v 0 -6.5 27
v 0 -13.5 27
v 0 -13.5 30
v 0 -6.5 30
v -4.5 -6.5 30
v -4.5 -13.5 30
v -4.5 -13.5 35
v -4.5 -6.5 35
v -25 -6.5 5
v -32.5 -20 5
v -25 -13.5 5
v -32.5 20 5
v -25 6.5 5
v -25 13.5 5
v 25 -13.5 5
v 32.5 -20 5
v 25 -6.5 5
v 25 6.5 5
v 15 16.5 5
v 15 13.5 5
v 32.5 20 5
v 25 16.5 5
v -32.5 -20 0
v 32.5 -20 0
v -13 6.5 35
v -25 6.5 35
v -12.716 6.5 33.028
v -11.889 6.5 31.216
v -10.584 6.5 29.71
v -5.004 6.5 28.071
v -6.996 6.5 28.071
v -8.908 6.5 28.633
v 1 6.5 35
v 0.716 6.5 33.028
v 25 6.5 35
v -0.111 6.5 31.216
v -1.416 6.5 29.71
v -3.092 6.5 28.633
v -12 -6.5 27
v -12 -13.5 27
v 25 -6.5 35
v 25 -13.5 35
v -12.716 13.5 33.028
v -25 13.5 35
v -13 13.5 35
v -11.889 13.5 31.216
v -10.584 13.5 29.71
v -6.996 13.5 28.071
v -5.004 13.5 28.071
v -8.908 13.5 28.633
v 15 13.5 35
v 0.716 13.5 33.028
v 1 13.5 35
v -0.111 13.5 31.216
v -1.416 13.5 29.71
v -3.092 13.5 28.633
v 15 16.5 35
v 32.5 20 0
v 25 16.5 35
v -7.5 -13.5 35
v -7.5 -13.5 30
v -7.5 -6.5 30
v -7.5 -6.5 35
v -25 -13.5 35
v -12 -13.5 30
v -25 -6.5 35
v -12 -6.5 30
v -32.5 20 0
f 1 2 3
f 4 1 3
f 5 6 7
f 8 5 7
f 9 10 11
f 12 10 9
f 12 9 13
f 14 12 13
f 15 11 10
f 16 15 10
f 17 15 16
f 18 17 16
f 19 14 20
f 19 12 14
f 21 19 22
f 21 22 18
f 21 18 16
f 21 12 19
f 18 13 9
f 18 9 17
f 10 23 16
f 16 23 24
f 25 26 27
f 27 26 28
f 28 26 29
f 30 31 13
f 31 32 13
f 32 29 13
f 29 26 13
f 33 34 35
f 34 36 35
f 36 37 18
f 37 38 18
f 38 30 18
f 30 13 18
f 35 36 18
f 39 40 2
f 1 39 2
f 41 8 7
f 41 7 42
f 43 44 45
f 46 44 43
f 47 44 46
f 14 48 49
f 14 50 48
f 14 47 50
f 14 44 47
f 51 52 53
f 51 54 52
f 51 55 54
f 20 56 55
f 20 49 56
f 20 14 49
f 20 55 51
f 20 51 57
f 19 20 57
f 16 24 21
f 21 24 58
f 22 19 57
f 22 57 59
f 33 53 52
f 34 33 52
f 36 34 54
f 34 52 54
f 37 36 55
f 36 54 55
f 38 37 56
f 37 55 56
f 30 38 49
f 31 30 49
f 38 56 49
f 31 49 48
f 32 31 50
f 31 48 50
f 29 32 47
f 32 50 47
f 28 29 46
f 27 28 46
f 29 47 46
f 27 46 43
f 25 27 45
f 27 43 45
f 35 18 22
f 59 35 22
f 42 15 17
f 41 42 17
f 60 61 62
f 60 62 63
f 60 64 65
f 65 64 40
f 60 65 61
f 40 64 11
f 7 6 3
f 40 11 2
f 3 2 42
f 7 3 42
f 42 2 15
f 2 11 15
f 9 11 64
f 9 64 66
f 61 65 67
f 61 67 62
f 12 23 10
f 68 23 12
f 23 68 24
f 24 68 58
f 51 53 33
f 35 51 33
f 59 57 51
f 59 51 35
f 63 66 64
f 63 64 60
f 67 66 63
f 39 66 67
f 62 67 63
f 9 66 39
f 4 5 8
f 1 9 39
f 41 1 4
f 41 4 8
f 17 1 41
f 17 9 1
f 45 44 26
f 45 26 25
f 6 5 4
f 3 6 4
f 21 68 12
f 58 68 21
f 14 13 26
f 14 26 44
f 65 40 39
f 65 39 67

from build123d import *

# Parameters (mm, degrees)
SKETCH_1_W          = 65
SKETCH_1_H          = 40
EXTRUDE_1_DEPTH     = 5
SKETCH_2_W          = 50
SKETCH_2_H          = 7
SKETCH_2_W_2        = 10
SKETCH_2_H_2        = 3
EXTRUDE_2_DEPTH     = 30
SKETCH_4_R          = 7
CUT_EXTRUDE_1_DEPTH = 7
SKETCH_7_W          = 12
SKETCH_7_H          = 3
SKETCH_7_W_2        = 3
SKETCH_7_H_2        = 5
CUT_EXTRUDE_3_DEPTH = 7


with BuildPart() as part:
    # Эскиз1 → Бобышка-Вытянуть1 (new body)
    with BuildSketch(Plane.XY):
        Rectangle(SKETCH_1_W, SKETCH_1_H)
    extrude(amount=EXTRUDE_1_DEPTH)

    # Эскиз2 → Бобышка-Вытянуть2 (add)
    with BuildSketch(Plane.XY.offset(5)):
        with Locations((0, 10)):
            Rectangle(SKETCH_2_W, SKETCH_2_H)
        with Locations((20, 15)):
            Rectangle(SKETCH_2_W_2, SKETCH_2_H_2)
        with Locations((0, -10)):
            Rectangle(SKETCH_2_W, SKETCH_2_H)
    extrude(amount=EXTRUDE_2_DEPTH)

    # Эскиз4 → Вырез-Вытянуть1 (cut)
    with BuildSketch(Plane(origin=(0, 13.5, 0), x_dir=(1, 0, 0), z_dir=(0, 1, 0))):
        with Locations((-6, -35)):
            Circle(SKETCH_4_R)
    extrude(amount=-CUT_EXTRUDE_1_DEPTH, mode=Mode.SUBTRACT)

    # Эскиз7 → Вырез-Вытянуть3 (cut)
    with BuildSketch(Plane.XZ.offset(13.5)):
        with Locations((-6, 28.5)):
            Rectangle(SKETCH_7_W, SKETCH_7_H)
        with Locations((-6, 32.5)):
            Rectangle(SKETCH_7_W_2, SKETCH_7_H_2)
    extrude(amount=-CUT_EXTRUDE_3_DEPTH, mode=Mode.SUBTRACT)


solid = part.part
